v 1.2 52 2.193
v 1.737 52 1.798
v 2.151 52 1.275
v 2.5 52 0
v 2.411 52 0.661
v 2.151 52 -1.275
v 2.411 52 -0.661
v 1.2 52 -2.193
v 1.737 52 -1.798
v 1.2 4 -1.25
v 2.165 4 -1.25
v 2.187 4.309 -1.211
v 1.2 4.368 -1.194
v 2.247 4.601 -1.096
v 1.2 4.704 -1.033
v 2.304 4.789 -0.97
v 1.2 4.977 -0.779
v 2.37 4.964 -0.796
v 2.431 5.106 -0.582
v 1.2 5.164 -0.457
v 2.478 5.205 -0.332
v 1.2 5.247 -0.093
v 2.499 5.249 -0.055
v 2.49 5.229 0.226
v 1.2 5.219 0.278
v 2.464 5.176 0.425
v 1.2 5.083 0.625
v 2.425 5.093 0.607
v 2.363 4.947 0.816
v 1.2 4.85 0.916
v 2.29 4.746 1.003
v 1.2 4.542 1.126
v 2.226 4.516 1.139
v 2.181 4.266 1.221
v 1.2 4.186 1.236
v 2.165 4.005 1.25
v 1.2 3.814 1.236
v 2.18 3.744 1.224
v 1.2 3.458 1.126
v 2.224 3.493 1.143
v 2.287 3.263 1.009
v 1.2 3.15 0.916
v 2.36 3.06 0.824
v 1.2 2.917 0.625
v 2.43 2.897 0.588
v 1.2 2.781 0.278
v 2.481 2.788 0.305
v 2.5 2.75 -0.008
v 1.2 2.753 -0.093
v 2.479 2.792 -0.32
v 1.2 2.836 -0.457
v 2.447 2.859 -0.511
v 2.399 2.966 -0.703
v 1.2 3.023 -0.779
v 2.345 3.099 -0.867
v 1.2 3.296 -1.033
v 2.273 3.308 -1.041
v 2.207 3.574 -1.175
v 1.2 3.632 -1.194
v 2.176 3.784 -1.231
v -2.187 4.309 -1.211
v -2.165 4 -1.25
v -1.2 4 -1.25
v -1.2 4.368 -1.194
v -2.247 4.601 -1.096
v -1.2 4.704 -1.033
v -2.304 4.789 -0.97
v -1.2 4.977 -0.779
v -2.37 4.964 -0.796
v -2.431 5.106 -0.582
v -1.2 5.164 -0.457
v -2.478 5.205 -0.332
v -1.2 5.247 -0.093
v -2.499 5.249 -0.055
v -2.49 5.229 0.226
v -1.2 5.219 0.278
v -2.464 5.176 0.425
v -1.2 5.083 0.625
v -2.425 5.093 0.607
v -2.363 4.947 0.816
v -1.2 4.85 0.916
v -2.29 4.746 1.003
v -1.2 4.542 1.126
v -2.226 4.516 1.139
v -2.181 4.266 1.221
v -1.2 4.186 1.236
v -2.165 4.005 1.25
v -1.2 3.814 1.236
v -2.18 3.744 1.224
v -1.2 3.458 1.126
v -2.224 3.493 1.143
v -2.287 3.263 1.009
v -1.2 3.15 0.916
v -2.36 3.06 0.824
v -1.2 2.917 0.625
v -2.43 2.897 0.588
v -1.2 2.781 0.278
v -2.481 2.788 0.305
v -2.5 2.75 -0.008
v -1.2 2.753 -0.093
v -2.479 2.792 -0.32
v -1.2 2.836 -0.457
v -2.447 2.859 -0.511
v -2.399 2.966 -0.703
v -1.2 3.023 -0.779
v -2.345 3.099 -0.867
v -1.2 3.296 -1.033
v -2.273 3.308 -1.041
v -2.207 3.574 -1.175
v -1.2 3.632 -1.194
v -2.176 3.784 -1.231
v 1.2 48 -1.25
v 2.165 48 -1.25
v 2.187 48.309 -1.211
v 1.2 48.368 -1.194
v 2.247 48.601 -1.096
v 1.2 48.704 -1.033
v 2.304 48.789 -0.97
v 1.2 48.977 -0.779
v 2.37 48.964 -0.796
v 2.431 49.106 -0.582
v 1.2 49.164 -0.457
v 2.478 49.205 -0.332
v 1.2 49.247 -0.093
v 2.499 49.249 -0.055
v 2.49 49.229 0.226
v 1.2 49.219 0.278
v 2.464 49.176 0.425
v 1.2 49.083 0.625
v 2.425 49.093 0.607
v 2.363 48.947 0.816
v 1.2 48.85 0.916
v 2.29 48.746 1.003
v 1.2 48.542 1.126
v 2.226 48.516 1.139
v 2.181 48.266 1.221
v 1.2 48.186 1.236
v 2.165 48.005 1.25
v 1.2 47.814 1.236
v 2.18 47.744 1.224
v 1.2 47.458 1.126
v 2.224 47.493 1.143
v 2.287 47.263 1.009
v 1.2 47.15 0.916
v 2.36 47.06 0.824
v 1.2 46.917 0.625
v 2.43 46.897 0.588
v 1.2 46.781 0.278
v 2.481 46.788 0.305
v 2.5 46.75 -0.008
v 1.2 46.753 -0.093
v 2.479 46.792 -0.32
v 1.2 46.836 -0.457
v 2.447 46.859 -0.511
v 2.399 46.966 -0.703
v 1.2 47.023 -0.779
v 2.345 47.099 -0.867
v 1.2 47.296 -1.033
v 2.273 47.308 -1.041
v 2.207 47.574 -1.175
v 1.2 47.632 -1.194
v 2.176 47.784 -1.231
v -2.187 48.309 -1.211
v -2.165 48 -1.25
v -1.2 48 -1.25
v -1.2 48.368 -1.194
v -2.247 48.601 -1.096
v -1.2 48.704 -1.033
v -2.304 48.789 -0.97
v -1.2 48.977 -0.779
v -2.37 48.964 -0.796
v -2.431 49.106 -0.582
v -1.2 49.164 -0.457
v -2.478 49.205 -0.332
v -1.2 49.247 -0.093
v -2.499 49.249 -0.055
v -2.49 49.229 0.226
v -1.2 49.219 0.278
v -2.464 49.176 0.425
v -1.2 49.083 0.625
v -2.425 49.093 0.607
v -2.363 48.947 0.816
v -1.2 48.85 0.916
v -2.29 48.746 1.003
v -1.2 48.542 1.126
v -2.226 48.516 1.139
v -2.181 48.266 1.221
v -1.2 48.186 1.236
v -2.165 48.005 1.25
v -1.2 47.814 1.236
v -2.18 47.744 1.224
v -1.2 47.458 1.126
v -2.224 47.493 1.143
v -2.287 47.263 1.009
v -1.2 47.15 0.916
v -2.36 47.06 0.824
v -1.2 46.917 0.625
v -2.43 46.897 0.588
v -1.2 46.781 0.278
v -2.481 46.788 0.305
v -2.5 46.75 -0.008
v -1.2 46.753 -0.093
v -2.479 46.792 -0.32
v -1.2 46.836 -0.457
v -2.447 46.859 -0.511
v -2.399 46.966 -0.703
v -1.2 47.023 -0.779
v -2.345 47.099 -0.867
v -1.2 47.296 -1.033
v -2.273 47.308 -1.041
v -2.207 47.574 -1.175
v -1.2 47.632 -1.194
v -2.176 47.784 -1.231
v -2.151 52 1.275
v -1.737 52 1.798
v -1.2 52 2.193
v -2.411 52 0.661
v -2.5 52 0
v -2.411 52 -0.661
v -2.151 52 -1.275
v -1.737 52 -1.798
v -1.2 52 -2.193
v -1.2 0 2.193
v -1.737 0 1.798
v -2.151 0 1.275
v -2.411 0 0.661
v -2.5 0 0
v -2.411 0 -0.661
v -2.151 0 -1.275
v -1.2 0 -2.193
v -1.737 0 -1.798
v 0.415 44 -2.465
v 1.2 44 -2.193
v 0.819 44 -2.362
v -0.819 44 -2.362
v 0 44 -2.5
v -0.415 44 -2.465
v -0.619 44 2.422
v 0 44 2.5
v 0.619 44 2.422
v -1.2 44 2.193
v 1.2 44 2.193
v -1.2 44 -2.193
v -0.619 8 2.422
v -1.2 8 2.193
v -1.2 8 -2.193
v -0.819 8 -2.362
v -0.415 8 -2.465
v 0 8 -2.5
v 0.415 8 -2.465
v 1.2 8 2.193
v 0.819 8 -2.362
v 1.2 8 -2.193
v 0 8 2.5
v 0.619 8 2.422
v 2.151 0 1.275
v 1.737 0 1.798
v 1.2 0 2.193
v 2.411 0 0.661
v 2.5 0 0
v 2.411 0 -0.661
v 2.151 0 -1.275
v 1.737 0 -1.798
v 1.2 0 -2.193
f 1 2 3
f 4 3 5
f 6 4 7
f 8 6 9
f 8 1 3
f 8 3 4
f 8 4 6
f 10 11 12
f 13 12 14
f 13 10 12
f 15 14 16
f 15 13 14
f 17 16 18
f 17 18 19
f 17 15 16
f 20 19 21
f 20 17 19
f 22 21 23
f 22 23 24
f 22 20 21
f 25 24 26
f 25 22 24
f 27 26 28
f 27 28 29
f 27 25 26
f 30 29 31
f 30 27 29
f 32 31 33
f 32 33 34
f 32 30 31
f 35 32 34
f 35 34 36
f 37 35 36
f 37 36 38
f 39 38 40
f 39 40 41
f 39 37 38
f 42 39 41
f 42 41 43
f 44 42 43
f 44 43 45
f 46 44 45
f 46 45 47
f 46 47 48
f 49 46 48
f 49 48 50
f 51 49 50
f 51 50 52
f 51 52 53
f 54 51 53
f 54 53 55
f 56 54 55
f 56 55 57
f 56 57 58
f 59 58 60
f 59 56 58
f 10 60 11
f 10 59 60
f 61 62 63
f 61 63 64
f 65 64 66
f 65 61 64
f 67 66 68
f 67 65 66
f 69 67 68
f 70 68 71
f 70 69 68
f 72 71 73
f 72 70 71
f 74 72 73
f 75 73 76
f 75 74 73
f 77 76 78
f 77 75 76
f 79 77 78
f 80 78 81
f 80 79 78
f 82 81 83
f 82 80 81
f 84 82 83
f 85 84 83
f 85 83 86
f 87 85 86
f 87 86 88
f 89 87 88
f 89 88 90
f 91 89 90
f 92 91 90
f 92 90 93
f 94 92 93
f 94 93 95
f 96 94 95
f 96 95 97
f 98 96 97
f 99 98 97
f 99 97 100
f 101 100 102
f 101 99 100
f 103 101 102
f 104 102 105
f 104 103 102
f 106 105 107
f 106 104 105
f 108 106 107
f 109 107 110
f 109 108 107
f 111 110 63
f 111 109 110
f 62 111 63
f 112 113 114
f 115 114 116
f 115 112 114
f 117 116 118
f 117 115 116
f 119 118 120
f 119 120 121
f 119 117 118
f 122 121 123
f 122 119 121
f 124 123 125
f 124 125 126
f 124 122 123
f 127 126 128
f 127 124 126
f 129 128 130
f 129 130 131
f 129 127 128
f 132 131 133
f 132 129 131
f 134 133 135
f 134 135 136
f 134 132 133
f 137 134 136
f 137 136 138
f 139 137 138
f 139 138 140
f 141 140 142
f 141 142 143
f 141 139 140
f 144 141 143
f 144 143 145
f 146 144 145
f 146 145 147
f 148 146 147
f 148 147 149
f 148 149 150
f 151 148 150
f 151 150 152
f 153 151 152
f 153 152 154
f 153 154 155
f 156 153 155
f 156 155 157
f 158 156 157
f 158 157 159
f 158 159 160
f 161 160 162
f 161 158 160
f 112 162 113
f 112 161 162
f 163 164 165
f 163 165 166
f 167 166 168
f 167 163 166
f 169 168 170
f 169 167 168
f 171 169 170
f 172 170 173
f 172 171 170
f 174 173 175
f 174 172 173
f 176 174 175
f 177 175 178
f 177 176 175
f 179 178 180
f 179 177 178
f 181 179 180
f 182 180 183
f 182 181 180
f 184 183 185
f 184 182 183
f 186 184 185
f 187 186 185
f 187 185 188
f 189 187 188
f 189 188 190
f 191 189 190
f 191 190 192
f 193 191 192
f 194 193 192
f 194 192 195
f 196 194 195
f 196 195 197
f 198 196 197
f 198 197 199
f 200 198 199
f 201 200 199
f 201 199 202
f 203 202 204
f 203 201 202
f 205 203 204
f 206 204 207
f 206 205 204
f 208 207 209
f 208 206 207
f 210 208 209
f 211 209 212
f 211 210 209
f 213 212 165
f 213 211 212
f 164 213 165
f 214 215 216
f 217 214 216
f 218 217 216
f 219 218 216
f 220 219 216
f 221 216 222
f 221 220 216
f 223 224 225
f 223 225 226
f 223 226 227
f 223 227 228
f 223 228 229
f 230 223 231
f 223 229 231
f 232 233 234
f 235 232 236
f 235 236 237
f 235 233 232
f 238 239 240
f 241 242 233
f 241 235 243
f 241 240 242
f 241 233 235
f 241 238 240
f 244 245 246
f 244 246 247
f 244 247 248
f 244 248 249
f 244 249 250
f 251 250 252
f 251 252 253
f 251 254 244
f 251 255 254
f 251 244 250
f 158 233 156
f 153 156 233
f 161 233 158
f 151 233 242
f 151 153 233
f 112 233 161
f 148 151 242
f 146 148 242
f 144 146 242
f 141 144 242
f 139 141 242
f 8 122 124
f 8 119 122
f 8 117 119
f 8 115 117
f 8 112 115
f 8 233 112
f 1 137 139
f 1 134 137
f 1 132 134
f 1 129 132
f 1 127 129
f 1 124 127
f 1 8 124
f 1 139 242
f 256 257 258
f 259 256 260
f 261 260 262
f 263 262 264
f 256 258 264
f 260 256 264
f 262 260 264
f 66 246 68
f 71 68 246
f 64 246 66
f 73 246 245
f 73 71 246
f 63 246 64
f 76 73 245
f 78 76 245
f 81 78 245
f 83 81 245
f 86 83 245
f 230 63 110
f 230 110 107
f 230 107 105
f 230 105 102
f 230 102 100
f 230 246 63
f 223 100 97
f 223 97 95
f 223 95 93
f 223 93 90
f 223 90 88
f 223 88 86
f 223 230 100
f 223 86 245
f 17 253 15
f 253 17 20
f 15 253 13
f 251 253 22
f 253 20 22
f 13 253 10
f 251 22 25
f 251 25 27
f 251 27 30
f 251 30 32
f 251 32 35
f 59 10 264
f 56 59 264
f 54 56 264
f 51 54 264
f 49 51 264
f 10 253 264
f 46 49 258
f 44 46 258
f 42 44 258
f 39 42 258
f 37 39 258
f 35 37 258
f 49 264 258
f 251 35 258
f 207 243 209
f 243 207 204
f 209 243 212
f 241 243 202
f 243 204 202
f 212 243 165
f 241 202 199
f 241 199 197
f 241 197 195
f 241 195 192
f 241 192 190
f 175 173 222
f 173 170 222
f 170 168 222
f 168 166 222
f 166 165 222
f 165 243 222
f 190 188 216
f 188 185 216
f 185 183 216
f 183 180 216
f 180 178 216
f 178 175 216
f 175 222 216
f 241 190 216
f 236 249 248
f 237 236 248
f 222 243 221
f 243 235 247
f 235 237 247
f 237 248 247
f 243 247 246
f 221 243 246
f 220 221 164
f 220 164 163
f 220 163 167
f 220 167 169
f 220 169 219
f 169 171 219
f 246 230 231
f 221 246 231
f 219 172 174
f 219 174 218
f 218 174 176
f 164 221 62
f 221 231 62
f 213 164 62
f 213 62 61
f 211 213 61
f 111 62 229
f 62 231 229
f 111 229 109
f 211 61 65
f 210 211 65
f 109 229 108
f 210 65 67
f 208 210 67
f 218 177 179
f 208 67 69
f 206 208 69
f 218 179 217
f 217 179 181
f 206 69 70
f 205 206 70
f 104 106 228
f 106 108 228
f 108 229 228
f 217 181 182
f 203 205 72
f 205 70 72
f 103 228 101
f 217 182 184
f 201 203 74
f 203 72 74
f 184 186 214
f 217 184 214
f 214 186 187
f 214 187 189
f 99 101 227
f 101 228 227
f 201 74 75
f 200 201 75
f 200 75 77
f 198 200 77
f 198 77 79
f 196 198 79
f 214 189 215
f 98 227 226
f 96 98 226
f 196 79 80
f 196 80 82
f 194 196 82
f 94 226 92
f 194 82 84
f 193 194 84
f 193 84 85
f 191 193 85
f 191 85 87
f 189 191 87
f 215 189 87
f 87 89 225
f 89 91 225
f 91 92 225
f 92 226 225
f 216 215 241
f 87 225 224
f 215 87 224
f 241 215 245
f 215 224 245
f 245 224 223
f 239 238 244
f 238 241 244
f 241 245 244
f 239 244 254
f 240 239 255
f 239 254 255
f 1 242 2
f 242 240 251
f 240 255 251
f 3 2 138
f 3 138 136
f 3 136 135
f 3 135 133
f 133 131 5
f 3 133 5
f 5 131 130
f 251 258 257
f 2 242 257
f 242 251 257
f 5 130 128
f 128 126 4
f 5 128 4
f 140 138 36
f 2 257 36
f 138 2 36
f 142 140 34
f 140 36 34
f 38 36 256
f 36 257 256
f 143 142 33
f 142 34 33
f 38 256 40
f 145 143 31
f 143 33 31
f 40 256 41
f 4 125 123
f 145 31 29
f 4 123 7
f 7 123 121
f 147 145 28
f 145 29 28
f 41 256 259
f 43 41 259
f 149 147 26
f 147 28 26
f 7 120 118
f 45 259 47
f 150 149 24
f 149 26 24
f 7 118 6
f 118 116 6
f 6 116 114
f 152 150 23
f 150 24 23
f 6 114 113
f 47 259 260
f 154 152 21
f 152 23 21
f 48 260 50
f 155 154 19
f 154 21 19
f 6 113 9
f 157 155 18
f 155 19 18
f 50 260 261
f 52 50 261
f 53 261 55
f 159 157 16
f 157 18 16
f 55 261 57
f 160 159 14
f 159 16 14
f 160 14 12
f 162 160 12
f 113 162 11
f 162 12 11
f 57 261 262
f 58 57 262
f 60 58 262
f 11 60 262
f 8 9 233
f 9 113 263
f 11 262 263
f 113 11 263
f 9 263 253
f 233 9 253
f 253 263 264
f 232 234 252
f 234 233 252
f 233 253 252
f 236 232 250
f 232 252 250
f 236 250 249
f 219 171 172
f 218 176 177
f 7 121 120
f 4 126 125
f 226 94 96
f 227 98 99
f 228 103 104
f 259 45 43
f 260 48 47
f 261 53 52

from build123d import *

# Parameters (mm, degrees)
SKETCH2_R               = 2.5
BOSS_EXTRUDE1_DEPTH     = 52
SKETCH3_W               = 2.4
SKETCH3_H               = 5
CUT_EXTRUDE1_DEPTH      = 8
CUT_EXTRUDE2_DEPTH      = 53.120053722
CUT_EXTRUDE2_DEPTH_BACK = 53.120053722
SKETCH4_R               = 1.25
SKETCH5_W               = 2.4
SKETCH5_H               = 5
CUT_EXTRUDE3_DEPTH      = 8


with BuildPart() as part:
    # Sketch2 → Boss-Extrude1 (new body)
    with BuildSketch(Plane(origin=(0, 0, 0), x_dir=(-1, 0, 0), z_dir=(0, 1, 0))):
        with Locations(Location((0, 0, 0), (0, 0, 270))):
            Circle(SKETCH2_R)
    extrude(amount=BOSS_EXTRUDE1_DEPTH)

    # Sketch3 → Cut-Extrude1 (cut)
    with BuildSketch(Plane.XZ):
        Rectangle(SKETCH3_W, SKETCH3_H)
    extrude(amount=-CUT_EXTRUDE1_DEPTH, mode=Mode.SUBTRACT)

    # Sketch4 → Cut-Extrude2 (cut, two sides: drawn at the far end of the back side and taken through both)
    with BuildSketch(Plane.YZ.offset(-CUT_EXTRUDE2_DEPTH_BACK)):
        with Locations(Location((4, 0, 0), (0, 0, 270))):
            Circle(SKETCH4_R)
        with Locations(Location((48, 0, 0), (0, 0, 270))):
            Circle(SKETCH4_R)
    extrude(amount=CUT_EXTRUDE2_DEPTH + CUT_EXTRUDE2_DEPTH_BACK, mode=Mode.SUBTRACT)

    # Sketch5 → Cut-Extrude3 (cut)
    with BuildSketch(Plane(origin=(0, 52, 0), x_dir=(-1, 0, 0), z_dir=(0, 1, 0))):
        Rectangle(SKETCH5_W, SKETCH5_H)
    extrude(amount=-CUT_EXTRUDE3_DEPTH, mode=Mode.SUBTRACT)


solid = part.part
